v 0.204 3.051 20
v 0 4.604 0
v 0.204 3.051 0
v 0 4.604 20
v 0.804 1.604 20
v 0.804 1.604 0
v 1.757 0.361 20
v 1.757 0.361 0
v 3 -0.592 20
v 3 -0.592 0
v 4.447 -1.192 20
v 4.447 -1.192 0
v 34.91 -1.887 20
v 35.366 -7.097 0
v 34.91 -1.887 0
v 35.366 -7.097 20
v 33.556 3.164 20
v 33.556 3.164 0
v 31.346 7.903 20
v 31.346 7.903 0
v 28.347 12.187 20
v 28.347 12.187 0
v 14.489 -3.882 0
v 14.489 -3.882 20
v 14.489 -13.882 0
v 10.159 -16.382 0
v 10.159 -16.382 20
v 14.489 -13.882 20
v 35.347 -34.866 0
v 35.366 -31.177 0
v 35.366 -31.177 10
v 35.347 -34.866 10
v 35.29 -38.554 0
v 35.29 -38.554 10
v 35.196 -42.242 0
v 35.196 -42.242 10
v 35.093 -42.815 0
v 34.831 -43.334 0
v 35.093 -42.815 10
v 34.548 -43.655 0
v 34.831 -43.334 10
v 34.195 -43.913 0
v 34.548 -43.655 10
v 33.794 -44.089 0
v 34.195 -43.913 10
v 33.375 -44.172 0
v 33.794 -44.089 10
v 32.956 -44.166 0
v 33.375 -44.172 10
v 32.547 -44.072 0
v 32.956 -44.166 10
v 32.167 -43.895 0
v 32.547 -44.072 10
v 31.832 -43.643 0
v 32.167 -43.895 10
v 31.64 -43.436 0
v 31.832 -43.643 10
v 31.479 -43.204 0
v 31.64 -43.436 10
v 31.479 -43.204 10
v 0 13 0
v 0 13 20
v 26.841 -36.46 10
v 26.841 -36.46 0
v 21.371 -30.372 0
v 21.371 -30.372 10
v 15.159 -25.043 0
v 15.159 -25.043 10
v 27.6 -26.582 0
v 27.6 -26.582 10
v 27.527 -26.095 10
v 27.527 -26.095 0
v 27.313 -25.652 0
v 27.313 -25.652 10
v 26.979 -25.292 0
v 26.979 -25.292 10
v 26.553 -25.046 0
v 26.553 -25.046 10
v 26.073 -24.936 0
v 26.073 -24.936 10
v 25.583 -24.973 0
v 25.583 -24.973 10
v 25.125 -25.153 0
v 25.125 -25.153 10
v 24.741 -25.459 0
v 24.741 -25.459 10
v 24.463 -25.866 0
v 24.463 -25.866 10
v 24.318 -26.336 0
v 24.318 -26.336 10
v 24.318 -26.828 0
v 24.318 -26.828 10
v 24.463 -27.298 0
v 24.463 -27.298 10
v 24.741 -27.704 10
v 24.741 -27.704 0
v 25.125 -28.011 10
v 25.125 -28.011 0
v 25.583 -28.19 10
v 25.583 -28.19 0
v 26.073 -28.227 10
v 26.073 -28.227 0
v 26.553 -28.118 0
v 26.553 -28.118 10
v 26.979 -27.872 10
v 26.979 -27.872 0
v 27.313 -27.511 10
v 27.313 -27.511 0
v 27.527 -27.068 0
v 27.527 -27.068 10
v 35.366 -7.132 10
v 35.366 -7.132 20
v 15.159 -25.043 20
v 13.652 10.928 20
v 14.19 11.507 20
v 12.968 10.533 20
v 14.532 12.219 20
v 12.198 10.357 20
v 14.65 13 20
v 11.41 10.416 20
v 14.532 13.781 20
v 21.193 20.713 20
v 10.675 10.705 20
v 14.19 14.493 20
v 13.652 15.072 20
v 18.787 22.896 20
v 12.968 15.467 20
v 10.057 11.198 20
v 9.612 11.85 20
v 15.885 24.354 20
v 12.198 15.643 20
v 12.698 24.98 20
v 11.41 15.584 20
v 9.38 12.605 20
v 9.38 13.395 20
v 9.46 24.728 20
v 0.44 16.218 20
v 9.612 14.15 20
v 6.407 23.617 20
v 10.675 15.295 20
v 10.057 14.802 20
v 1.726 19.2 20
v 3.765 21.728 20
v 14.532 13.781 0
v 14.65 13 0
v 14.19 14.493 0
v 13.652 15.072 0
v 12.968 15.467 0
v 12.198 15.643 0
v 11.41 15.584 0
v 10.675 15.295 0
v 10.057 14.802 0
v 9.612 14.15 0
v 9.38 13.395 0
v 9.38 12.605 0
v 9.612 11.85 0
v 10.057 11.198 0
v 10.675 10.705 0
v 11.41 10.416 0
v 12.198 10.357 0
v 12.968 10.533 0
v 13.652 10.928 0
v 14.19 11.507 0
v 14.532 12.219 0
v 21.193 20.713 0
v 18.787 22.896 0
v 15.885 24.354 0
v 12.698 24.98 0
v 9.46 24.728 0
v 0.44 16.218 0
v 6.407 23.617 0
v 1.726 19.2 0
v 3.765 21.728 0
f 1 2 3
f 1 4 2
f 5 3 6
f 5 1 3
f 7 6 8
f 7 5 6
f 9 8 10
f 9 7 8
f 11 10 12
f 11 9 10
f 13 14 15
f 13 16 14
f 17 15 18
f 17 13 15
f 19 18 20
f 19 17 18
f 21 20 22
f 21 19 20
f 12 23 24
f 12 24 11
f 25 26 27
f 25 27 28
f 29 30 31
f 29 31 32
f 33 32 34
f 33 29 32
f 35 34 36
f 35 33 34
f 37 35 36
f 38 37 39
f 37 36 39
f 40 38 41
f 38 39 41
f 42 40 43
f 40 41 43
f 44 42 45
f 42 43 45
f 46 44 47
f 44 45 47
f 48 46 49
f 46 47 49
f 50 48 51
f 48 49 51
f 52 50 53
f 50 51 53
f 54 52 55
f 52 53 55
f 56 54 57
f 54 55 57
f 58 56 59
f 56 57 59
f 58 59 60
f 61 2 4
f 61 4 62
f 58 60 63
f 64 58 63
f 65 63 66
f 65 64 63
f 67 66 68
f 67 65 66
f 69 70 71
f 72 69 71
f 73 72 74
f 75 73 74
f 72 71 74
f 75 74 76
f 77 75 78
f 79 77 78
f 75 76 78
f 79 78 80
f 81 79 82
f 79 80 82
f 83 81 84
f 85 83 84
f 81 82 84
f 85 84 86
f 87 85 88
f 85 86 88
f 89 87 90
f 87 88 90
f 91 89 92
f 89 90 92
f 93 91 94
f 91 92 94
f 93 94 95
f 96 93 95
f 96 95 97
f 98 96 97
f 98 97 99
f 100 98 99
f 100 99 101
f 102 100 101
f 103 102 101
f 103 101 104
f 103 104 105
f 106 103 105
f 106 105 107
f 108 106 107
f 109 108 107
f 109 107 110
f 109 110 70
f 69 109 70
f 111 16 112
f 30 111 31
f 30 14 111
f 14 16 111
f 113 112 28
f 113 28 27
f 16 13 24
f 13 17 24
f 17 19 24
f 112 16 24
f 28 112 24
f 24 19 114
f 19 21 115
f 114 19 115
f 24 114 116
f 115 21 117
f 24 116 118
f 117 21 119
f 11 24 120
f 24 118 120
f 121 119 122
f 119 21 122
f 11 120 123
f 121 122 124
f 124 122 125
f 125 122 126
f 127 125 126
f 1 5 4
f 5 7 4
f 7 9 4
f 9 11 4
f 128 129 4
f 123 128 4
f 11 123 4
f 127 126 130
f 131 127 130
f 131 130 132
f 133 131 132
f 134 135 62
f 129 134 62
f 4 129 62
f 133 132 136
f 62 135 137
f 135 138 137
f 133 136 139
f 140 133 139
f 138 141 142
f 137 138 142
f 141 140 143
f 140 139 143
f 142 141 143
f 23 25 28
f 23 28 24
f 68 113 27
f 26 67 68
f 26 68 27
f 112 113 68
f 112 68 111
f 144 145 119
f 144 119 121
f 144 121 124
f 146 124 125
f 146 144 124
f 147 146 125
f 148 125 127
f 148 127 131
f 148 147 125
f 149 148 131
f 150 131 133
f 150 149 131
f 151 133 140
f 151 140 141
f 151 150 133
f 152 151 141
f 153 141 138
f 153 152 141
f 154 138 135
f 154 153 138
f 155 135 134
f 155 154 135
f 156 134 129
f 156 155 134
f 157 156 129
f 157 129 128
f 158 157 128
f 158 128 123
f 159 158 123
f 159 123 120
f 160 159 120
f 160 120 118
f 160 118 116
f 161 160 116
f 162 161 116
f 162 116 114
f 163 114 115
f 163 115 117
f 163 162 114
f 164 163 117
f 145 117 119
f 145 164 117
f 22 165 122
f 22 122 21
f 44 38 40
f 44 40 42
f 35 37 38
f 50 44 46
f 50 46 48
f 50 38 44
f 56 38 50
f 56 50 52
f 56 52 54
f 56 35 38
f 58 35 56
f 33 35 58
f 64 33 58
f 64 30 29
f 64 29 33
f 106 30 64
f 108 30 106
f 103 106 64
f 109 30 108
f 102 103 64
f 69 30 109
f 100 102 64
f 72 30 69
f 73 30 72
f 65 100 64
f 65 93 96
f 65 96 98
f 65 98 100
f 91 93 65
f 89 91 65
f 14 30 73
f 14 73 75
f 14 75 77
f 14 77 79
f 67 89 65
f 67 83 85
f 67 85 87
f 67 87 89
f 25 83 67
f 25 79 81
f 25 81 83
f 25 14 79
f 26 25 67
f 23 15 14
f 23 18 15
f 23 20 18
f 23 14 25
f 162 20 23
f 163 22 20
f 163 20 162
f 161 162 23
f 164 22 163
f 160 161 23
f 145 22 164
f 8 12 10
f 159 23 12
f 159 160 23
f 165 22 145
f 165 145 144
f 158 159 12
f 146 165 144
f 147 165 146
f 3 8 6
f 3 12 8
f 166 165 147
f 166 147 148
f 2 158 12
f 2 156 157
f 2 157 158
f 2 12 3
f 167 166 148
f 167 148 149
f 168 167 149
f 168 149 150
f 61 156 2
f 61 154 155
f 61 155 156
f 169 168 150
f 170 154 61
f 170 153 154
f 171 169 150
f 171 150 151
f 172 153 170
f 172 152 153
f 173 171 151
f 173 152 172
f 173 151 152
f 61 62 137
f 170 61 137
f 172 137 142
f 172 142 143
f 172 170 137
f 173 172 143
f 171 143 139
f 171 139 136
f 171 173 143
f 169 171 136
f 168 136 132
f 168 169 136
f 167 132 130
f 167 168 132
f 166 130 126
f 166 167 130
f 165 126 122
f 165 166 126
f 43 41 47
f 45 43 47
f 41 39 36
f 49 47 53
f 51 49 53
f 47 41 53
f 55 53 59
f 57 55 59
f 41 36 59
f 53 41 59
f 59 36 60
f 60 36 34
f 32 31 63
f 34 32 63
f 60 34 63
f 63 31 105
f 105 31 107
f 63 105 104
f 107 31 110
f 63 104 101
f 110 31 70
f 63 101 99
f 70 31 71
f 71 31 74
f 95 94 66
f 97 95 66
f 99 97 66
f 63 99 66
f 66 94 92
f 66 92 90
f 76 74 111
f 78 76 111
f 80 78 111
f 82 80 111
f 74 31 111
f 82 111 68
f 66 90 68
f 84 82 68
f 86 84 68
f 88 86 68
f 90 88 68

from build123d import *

# Parameters (mm, degrees)
SKETCH_1_R          = 2.65
EXTRUDE_1_DEPTH     = 20
CUT_EXTRUDE_1_DEPTH = 10
FILLET_1_R          = 2
FILLET_2_R          = 30
SKETCH_3_R          = 1.65
CUT_EXTRUDE_2_DEPTH = 58.468525672
FILLET_3_R          = 6


with BuildPart() as part:
    # 草图1 → 凸台-拉伸1 (new body)
    with BuildSketch(Plane.XY):
        with BuildLine():
            Line((0, 0), (0, 13))
            ThreePointArc((0, 13), (7.89575828, 24.276311449), (21.192533317, 20.713451316))
            Line((21.192533317, 20.713451316), (35.365655494, 3.822582044))
            Line((35.365655494, 3.822582044), (35.365655494, -31.177417956))
            ThreePointArc((35.365655494, -31.177417956), (35.245743493, -40.47423292), (34.886087273, -49.764862326))
            ThreePointArc((34.886087273, -49.764862326), (26.594605872, -36.149168843), (15.158760375, -25.042539714))
            Line((15.158760375, -25.042539714), (10.158760375, -16.382285677))
            Line((10.158760375, -16.382285677), (14.488887394, -13.882285677))
            Line((14.488887394, -13.882285677), (14.488887394, -3.882285677))
            Line((14.488887394, -3.882285677), (0, 0))
        make_face()
        with Locations((12, 13)):
            Circle(SKETCH_1_R, mode=Mode.SUBTRACT)
    extrude(amount=EXTRUDE_1_DEPTH)

    # 草图2 → 切除-拉伸1 (cut)
    with BuildSketch(Plane.XY.offset(20)):
        Polygon((15.158760375, -25.042539714), (35.365655494, -7.132145445), (35.365655494, -70.887668239), (13.758782183, -70.887668239), align=None)
    extrude(amount=-CUT_EXTRUDE_1_DEPTH, mode=Mode.SUBTRACT)

    # 圆角1
    fillet_1_edges = [part.edges().sort_by_distance(p)[0] for p in [
        (34.886087273, -49.764862326, 5),
    ]]
    fillet(fillet_1_edges, radius=FILLET_1_R)

    # 圆角2
    fillet_2_edges = [part.edges().sort_by_distance(p)[0] for p in [
        (35.365655494, 3.822582044, 10),
    ]]
    fillet(fillet_2_edges, radius=FILLET_2_R)

    # 草图3 → 切除-拉伸2 (cut, through all)
    with BuildSketch(Plane.XY.offset(10)):
        with Locations((25.95004871, -26.58161927)):
            Circle(SKETCH_3_R)
    extrude(amount=-CUT_EXTRUDE_2_DEPTH, mode=Mode.SUBTRACT)

    # 圆角3
    fillet_3_edges = [part.edges().sort_by_distance(p)[0] for p in [
        (0, 0, 10),
    ]]
    fillet(fillet_3_edges, radius=FILLET_3_R)


solid = part.part
